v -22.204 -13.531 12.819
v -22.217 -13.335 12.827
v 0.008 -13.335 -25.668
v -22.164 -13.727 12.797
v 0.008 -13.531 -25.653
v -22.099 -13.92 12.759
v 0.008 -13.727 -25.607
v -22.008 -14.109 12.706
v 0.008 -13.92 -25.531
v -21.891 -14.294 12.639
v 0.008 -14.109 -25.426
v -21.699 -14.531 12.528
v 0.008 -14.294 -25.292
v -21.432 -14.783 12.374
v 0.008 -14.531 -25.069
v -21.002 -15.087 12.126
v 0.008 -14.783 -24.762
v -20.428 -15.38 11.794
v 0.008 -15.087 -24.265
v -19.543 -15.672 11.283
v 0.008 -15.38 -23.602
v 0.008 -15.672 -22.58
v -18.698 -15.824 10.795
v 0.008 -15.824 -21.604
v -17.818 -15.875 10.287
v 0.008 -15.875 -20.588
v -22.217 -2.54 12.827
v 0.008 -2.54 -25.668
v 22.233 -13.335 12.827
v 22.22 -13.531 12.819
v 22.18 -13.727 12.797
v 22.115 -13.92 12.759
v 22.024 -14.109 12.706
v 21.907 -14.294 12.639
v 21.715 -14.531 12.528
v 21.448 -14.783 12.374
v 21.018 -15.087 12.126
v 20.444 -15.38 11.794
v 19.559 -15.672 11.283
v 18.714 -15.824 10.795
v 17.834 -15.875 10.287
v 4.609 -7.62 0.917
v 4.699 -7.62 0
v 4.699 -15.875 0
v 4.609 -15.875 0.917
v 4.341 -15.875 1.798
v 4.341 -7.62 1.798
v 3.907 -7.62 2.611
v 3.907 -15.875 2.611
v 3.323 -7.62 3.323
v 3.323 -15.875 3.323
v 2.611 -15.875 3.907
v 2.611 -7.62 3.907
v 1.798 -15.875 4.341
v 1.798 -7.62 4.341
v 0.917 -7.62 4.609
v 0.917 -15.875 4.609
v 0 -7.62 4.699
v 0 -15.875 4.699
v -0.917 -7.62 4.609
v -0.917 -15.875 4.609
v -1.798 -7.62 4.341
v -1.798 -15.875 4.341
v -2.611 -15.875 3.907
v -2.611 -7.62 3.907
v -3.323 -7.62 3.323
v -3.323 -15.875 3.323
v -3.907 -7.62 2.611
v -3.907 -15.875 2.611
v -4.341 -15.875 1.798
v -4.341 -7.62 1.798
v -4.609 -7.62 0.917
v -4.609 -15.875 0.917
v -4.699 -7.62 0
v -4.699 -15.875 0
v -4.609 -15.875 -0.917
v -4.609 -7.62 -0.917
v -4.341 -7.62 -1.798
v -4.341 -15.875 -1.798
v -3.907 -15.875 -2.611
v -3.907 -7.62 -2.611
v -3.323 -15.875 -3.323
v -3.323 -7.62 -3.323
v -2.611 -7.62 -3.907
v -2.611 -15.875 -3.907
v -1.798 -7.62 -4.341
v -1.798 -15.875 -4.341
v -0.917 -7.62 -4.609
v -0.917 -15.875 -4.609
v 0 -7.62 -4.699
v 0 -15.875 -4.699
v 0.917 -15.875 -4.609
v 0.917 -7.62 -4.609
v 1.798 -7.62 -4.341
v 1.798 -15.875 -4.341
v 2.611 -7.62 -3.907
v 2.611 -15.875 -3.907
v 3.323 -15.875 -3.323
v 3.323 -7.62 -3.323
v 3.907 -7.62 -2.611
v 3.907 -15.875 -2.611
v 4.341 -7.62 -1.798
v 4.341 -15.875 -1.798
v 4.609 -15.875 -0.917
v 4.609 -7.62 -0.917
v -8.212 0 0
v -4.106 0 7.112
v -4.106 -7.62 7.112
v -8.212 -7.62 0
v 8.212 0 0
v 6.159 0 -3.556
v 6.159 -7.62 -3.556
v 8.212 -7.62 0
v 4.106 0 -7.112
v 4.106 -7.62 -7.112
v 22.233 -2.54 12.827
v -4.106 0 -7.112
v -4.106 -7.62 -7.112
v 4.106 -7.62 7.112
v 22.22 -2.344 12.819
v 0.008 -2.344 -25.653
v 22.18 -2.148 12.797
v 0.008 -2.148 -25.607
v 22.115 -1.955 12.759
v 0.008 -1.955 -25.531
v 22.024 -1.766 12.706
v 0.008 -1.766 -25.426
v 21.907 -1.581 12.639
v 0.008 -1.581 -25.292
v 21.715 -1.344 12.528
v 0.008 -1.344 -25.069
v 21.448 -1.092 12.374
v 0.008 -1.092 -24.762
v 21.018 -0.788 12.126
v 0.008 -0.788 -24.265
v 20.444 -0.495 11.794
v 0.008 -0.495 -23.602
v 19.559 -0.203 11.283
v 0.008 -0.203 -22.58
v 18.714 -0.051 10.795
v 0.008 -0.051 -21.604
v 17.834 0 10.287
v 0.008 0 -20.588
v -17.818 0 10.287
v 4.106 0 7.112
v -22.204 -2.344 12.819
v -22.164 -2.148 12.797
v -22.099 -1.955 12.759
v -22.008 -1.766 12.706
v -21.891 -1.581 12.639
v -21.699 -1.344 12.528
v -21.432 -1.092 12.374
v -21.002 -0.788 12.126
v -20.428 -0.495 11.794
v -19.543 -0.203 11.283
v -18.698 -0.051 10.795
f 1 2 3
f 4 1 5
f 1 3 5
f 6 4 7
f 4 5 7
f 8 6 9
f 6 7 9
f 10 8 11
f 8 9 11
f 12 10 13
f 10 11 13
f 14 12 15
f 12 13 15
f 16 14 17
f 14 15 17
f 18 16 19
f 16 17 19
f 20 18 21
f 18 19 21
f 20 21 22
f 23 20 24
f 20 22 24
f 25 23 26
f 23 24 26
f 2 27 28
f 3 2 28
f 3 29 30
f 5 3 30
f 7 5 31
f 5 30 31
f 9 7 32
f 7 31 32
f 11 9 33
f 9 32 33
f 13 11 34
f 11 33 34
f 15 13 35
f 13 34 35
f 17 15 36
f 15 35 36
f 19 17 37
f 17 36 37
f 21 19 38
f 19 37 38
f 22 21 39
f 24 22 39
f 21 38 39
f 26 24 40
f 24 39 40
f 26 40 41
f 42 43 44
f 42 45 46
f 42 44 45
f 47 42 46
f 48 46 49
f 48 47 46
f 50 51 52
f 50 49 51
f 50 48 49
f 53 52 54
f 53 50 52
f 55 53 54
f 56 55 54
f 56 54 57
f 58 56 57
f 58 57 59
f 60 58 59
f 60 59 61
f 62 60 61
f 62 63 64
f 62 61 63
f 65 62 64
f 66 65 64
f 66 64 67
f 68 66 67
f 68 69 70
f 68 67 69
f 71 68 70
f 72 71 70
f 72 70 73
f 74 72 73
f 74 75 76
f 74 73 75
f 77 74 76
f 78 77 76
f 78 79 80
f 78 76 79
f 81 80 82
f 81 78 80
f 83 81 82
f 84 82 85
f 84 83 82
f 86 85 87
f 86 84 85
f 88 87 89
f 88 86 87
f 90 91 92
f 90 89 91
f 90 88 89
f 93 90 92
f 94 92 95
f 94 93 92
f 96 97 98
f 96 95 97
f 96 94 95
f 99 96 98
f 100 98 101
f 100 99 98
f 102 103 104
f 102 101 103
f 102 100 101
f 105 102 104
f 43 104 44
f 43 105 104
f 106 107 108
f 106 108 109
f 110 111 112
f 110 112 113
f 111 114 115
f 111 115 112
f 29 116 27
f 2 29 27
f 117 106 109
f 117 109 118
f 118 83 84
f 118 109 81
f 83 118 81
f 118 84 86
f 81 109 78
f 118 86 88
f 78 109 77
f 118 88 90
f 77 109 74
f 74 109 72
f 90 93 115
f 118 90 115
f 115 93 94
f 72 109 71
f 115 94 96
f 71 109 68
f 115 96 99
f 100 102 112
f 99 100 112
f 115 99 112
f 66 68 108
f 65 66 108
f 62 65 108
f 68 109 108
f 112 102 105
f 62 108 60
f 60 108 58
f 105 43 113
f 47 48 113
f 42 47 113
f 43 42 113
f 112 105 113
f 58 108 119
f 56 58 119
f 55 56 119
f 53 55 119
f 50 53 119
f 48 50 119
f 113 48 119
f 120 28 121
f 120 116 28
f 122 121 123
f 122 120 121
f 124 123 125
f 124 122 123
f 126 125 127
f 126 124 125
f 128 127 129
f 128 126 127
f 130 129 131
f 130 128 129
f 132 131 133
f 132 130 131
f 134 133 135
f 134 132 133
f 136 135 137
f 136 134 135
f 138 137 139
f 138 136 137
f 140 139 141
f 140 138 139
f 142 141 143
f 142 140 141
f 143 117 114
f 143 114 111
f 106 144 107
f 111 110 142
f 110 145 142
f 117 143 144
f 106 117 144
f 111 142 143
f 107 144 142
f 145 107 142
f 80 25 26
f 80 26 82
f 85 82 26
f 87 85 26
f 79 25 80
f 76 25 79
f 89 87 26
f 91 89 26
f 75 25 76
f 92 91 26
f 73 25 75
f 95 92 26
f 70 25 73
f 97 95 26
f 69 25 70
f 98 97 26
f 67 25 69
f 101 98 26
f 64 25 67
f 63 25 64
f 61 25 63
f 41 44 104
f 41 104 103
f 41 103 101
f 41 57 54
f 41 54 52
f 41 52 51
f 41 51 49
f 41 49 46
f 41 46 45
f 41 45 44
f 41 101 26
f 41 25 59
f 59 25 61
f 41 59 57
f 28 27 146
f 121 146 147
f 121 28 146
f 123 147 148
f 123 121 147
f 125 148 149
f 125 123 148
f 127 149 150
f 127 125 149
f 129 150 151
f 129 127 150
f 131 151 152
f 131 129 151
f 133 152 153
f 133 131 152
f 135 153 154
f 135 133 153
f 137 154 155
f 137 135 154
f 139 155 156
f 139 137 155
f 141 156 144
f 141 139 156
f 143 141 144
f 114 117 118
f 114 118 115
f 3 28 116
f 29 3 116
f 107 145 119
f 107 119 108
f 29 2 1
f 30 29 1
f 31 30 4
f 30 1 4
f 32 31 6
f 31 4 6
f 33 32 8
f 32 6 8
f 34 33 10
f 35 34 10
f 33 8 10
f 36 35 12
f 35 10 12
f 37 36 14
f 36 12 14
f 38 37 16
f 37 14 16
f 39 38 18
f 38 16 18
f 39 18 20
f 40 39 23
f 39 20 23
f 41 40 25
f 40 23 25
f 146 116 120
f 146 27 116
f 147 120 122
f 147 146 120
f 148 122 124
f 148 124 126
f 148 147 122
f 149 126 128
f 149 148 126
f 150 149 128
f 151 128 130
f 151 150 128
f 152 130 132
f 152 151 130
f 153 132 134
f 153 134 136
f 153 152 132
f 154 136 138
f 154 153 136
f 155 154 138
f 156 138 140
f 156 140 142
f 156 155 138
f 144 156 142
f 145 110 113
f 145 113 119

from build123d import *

# Parameters (mm, degrees)
F2_DEPTH = 15.875
F3_DEPTH = 7.62
F4_R     = 4.699
F5_DEPTH = 25.4
F6_R     = 2.54


with BuildPart() as f2:
    # F0 (on Front) → F2 (new body)
    with BuildSketch(Plane.XZ):
        Polygon((22.232984, 12.827), (-22.217016, 12.827), (0.007984, -25.667829), align=None)
    extrude(amount=F2_DEPTH)

    # F1 (on Front) → F3 (cut)
    with BuildSketch(Plane.XZ):
        Polygon((6.159173, -3.556), (8.21223, 0), (4.106115, 7.112), (-4.106115, 7.112), (-8.21223, 0), (-4.106115, -7.112), (4.106115, -7.112), align=None)
    extrude(amount=F3_DEPTH, mode=Mode.SUBTRACT)

    # F4 (on Front) → F5 (cut)
    with BuildSketch(Plane.XZ):
        Circle(F4_R)
    extrude(amount=F5_DEPTH, mode=Mode.SUBTRACT)

    # F6
    f6_edges = [f2.edges().sort_by_distance(p)[0] for p in [
        (-11.104516, 0, -6.420415),
        (0.007984, 0, 12.827),
        (11.120484, 0, -6.420415),
        (0.007984, -15.875, 12.827),
        (-11.104516, -15.875, -6.420415),
        (11.120484, -15.875, -6.420415),
    ]]
    fillet(f6_edges, radius=F6_R)


solid = f2.part
